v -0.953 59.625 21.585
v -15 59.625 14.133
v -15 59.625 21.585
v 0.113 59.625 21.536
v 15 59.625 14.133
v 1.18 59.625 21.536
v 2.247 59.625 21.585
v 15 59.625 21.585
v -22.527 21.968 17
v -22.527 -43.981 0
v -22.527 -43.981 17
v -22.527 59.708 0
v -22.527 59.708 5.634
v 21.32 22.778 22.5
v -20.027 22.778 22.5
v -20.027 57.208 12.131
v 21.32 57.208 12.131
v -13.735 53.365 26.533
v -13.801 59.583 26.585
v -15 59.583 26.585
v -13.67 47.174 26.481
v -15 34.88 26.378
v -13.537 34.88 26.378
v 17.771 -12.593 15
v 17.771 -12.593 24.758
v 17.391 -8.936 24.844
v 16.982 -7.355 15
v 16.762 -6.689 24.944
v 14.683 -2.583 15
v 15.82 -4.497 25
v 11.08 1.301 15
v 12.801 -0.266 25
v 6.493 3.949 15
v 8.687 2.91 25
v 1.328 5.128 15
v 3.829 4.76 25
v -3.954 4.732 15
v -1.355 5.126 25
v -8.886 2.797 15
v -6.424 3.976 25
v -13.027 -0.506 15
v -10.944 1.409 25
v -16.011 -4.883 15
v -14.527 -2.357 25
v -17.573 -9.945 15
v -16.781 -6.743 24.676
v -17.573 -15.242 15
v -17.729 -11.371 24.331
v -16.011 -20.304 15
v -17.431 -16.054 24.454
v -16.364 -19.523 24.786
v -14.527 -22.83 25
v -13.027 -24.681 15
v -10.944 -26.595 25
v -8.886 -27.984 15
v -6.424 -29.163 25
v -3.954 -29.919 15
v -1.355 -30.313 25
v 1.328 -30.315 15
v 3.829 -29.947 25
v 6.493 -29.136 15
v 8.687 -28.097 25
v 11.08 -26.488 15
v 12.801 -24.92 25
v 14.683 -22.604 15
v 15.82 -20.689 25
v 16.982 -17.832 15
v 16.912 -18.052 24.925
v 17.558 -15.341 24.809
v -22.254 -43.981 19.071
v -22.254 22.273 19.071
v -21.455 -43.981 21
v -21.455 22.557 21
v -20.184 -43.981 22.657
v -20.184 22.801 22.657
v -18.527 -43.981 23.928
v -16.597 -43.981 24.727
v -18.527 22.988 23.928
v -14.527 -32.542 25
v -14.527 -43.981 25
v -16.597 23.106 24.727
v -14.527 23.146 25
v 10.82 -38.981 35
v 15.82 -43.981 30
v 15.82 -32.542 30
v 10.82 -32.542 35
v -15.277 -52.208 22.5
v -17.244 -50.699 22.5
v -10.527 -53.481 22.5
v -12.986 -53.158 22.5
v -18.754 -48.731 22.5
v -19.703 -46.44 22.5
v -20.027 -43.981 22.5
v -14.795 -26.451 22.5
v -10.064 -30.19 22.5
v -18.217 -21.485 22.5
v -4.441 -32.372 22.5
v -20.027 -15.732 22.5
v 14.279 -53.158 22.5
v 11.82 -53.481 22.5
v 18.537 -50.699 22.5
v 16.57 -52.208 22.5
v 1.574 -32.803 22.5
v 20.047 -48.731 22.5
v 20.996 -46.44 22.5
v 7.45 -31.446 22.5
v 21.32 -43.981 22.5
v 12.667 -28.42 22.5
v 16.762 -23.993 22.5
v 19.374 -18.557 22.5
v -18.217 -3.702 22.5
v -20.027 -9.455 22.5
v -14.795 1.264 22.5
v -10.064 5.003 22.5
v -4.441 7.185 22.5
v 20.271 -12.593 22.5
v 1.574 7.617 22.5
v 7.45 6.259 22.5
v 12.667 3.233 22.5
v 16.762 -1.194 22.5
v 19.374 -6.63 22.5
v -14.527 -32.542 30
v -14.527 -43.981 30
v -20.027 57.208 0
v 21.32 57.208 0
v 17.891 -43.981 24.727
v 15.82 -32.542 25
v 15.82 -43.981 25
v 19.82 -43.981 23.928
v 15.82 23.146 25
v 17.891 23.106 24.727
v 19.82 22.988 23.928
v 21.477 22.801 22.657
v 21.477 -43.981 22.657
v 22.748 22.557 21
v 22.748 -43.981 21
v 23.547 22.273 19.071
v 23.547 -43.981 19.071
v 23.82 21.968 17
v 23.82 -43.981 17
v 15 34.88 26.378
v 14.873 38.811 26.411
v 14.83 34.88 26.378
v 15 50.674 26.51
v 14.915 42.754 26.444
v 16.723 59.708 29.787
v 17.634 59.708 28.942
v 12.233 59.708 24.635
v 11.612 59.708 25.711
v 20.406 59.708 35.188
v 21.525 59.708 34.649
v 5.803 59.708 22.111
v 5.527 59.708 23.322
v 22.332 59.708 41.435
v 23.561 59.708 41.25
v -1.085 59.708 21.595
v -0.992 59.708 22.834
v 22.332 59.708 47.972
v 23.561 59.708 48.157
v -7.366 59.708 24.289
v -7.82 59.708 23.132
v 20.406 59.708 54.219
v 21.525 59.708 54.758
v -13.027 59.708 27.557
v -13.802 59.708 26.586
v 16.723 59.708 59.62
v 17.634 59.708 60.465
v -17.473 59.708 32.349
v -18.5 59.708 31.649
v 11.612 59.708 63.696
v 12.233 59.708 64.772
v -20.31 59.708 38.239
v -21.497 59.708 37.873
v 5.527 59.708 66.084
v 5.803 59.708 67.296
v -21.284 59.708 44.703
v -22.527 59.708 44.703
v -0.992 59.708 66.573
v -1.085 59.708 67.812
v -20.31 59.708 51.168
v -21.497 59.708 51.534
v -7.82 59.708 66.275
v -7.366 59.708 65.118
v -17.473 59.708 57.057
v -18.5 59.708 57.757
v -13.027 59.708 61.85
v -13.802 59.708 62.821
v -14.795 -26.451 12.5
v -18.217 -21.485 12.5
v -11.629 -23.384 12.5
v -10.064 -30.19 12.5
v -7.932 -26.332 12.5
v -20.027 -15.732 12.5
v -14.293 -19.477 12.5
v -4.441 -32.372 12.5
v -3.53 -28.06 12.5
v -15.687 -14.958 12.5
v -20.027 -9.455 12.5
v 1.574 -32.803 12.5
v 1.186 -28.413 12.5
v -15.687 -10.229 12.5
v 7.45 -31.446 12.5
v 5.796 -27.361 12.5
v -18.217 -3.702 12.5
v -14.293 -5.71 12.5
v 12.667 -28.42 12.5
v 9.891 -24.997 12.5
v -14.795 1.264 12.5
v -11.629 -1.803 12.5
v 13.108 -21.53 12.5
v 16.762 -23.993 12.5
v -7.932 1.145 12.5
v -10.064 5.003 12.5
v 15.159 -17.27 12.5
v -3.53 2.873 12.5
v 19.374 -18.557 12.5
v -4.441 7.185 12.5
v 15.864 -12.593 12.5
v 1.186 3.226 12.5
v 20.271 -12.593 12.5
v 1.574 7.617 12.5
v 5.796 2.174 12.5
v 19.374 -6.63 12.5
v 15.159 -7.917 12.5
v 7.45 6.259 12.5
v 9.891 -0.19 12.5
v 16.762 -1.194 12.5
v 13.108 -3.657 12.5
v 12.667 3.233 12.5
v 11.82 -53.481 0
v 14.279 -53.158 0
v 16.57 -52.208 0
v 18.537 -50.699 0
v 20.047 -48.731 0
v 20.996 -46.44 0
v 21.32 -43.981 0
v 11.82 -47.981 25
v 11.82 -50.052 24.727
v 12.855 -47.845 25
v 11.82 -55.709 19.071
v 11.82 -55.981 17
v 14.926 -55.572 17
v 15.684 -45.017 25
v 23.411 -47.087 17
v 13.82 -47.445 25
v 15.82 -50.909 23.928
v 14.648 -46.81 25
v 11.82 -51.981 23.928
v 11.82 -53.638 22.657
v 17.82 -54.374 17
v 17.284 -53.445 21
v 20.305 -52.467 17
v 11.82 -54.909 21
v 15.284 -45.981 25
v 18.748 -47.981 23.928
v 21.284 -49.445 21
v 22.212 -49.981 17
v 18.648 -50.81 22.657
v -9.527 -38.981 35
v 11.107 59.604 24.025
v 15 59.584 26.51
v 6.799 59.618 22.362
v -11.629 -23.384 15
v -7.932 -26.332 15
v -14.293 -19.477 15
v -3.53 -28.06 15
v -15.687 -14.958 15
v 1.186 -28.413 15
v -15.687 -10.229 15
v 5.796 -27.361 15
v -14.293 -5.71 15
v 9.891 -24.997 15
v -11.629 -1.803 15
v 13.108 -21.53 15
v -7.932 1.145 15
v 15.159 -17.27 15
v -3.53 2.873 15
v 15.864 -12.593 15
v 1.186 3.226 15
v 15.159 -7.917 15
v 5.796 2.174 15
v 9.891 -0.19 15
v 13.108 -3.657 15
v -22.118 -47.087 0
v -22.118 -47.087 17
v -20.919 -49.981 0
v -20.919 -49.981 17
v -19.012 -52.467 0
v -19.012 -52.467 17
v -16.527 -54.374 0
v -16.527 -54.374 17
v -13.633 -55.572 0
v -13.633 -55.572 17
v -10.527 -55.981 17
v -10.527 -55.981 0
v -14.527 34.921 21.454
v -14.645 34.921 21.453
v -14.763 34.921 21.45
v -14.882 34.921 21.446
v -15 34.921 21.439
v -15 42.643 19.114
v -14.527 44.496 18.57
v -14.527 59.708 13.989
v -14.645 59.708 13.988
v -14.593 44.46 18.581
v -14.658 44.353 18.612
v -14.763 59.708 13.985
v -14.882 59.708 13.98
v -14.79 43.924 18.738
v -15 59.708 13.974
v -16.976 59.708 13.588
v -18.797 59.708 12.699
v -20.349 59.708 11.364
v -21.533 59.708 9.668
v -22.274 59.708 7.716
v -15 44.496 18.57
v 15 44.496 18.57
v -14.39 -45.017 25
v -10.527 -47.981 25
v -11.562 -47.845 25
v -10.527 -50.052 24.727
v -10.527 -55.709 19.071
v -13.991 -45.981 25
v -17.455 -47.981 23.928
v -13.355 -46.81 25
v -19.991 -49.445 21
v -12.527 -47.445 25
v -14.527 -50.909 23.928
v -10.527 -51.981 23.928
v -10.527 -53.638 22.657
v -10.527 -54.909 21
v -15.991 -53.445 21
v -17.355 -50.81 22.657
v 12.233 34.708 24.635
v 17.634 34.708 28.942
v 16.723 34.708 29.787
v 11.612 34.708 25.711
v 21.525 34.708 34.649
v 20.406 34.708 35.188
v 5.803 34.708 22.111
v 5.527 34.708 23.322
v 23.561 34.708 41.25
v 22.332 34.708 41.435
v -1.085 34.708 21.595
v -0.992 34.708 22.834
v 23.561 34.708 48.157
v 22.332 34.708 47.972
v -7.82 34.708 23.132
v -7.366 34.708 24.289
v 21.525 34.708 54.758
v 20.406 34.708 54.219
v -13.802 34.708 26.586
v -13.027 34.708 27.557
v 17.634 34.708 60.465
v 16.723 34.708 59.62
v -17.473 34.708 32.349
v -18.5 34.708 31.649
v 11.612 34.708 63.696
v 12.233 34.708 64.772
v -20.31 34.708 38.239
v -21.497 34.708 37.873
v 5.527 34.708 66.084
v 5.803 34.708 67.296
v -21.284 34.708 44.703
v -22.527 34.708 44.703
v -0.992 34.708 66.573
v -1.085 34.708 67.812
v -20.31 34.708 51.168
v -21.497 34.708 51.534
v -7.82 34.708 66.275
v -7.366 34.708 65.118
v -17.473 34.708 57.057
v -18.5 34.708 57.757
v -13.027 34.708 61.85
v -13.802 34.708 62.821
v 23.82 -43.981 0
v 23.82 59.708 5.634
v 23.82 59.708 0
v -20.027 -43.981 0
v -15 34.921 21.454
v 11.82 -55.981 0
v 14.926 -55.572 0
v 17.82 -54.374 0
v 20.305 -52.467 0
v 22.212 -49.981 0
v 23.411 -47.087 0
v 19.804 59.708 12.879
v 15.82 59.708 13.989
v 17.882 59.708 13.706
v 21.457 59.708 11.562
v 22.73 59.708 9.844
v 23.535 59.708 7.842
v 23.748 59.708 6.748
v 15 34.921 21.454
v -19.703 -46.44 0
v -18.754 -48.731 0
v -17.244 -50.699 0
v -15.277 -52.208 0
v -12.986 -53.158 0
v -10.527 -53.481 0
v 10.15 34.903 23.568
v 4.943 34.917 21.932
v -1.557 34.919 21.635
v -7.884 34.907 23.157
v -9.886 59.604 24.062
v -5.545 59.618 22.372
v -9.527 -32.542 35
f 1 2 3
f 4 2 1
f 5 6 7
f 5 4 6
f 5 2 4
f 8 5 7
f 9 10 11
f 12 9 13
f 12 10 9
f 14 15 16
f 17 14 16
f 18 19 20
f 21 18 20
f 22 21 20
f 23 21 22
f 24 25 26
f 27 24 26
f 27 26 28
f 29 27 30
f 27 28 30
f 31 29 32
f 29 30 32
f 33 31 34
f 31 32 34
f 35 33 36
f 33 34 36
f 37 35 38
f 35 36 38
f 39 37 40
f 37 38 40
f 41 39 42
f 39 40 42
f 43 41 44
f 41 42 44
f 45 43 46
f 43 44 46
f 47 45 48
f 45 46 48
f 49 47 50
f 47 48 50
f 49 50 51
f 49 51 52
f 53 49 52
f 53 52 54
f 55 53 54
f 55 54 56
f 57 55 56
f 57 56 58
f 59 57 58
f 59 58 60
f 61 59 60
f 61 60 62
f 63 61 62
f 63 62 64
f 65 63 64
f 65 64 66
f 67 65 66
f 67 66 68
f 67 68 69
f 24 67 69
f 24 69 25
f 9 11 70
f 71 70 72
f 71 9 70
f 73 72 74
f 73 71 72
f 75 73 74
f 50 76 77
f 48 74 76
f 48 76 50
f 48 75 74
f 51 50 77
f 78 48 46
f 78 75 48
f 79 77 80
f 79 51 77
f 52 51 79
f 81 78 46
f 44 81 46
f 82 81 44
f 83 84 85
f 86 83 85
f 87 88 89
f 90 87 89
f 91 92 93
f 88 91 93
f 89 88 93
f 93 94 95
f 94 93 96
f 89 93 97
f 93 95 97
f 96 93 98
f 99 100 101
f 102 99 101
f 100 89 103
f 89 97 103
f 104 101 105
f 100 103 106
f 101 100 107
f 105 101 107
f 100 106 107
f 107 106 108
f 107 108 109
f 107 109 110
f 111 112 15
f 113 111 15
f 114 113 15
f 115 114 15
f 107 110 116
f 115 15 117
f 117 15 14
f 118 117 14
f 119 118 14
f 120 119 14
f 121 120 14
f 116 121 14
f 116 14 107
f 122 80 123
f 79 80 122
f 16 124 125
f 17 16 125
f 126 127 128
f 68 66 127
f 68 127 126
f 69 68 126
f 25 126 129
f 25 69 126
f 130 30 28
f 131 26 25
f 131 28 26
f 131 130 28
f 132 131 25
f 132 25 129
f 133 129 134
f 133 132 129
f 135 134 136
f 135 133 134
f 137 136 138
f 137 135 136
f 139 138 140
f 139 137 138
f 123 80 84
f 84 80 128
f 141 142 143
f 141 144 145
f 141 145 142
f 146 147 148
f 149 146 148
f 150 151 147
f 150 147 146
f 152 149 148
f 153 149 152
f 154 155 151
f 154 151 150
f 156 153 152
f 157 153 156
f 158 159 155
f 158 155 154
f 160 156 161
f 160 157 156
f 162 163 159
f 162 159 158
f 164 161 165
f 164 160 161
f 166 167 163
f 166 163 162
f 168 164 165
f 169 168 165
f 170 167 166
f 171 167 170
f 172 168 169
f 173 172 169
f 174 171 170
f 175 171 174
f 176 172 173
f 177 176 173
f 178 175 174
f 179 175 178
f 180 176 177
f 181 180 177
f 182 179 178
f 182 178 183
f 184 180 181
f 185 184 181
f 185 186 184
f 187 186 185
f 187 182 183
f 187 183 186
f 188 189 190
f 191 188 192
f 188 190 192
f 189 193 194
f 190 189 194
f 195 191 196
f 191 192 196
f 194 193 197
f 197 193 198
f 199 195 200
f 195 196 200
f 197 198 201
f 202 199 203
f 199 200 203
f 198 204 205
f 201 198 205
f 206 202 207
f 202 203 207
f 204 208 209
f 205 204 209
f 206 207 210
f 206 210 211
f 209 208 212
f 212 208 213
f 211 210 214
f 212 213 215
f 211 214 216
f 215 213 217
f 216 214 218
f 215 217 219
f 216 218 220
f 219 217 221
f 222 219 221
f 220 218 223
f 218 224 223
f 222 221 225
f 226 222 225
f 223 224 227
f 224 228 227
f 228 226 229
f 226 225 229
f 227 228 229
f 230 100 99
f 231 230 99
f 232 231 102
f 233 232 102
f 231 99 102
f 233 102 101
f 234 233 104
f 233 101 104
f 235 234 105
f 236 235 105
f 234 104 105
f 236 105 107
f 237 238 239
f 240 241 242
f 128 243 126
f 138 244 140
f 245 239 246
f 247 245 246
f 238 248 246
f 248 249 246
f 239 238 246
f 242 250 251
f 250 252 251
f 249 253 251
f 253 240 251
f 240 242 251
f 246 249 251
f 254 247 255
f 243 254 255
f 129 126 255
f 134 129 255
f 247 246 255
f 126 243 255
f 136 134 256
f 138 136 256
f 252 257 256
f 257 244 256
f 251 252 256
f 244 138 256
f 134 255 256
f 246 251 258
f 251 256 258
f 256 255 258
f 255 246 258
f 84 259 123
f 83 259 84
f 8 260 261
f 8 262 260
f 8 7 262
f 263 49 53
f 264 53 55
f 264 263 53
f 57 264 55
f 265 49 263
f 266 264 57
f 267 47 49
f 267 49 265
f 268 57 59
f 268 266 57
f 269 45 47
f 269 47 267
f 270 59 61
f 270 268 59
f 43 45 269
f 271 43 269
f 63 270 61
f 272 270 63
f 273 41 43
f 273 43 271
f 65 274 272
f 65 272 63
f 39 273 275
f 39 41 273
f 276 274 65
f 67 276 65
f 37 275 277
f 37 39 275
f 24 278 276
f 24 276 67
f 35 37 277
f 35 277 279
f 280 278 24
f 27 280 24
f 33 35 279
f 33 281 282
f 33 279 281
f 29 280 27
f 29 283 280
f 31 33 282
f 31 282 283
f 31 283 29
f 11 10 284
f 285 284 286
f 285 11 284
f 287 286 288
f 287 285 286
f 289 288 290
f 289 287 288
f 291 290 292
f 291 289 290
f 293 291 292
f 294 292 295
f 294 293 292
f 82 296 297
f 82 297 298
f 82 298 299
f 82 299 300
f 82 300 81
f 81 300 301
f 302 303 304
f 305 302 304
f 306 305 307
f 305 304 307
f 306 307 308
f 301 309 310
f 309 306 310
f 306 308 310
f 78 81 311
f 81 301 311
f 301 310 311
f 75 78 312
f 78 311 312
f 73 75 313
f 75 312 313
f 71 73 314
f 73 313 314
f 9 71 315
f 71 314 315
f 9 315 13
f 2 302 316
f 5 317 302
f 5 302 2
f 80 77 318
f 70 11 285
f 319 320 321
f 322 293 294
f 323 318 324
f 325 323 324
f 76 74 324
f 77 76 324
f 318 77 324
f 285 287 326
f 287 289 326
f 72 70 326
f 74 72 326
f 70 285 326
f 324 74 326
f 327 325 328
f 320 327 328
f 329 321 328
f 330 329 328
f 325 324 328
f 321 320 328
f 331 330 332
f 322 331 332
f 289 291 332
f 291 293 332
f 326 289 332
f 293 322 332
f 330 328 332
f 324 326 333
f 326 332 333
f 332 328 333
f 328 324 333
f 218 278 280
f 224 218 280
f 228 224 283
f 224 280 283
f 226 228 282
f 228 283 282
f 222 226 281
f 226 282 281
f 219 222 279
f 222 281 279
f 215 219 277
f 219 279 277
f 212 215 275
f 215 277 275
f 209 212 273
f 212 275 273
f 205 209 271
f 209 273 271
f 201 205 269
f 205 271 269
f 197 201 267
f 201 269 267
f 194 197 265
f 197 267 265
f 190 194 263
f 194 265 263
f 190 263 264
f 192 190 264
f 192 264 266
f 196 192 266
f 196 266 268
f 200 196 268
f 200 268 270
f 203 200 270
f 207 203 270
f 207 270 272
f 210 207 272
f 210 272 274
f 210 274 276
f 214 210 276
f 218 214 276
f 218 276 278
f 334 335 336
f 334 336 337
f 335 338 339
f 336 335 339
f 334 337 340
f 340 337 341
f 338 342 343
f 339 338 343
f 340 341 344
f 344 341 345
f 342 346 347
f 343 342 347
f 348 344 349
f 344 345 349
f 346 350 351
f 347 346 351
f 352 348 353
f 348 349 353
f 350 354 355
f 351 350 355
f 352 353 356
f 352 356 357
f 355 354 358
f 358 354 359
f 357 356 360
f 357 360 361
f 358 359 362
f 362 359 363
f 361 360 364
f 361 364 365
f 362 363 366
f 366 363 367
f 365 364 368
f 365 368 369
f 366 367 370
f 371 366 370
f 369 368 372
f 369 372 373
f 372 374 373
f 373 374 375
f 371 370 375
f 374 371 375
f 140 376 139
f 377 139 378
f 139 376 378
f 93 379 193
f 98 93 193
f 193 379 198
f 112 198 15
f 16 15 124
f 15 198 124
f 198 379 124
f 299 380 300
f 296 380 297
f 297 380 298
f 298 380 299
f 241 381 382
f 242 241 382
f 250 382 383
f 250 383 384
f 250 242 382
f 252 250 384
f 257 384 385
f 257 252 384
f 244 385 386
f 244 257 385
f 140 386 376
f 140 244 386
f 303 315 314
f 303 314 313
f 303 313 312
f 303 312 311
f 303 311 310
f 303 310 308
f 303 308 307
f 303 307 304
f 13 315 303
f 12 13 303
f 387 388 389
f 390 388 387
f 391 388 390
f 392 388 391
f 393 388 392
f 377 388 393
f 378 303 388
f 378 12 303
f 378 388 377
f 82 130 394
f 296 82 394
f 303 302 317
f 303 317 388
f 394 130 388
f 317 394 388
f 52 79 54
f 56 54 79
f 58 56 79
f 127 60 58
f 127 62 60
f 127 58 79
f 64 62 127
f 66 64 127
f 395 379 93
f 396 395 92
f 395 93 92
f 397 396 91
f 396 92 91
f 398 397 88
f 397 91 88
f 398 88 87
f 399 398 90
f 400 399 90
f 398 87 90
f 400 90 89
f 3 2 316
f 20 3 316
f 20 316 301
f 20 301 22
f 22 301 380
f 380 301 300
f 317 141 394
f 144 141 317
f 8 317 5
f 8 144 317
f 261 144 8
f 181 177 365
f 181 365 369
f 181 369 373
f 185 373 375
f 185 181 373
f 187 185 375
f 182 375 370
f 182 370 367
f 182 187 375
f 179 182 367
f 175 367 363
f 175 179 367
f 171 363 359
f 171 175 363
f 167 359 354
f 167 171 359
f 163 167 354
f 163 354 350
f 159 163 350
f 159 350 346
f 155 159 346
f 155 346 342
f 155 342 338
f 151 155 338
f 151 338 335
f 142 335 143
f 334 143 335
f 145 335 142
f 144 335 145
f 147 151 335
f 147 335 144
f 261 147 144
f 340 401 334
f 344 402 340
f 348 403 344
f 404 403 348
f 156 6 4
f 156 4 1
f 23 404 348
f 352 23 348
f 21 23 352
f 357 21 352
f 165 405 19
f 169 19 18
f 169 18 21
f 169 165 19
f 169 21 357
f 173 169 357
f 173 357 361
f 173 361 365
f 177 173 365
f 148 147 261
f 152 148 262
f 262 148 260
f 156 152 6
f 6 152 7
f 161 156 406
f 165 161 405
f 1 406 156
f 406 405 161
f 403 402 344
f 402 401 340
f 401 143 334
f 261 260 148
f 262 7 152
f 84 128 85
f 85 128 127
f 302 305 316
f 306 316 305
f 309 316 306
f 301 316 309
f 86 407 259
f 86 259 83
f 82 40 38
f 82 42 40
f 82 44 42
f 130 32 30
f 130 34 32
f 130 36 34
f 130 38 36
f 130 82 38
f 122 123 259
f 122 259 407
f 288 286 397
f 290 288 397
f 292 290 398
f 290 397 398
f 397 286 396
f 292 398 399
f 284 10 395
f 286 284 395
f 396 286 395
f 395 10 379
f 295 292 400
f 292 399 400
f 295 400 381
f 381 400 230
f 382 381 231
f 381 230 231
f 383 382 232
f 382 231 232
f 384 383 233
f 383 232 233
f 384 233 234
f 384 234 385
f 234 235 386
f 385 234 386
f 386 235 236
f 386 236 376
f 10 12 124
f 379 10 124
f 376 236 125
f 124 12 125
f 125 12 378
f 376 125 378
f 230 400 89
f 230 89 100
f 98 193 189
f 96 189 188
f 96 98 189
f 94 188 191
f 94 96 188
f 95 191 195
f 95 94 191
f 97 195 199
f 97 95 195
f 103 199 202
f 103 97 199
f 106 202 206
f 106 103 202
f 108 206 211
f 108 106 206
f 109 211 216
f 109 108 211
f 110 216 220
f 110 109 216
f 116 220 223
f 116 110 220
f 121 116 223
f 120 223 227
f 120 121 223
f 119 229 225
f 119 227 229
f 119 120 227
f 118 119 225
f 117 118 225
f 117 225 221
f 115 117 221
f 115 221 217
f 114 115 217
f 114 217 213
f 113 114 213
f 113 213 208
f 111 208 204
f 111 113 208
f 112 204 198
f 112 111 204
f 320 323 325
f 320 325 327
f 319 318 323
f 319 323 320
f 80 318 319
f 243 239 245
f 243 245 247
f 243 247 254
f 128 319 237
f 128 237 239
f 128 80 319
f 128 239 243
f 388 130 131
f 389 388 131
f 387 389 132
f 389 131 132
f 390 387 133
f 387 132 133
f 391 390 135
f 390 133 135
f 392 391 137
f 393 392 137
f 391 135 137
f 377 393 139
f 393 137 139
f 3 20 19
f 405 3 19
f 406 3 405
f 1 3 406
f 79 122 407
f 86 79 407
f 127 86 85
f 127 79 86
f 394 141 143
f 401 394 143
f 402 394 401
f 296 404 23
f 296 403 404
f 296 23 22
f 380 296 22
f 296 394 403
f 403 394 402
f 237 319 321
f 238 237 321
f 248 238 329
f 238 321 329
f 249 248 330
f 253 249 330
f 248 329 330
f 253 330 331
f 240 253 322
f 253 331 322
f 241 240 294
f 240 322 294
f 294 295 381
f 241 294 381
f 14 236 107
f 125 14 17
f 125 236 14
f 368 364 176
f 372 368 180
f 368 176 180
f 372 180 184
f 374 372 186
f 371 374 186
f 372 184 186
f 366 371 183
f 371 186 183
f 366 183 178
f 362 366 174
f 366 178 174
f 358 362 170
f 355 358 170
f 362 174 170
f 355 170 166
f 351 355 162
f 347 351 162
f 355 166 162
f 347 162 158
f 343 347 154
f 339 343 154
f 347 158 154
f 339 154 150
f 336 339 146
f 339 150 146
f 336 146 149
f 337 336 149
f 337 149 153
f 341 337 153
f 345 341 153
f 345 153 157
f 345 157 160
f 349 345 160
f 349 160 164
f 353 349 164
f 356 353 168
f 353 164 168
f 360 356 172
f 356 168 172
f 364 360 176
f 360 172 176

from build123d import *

# Parameters (mm, degrees)
F0_W           = 46.3467240334
F0_H           = 115.6897172332
F1_DEPTH       = 25
F2_R           = 12
F4_DEPTH       = 40
F4_DEPTH_BACK  = 40
F6_R           = 17.7712313218
F7_DEPTH       = 10
F8_R           = 23.1733620167
F9_DEPTH       = 25
F11_R          = 21.9307918762
F12_DEPTH      = 25
F14_DEPTH      = 15
F14_DEPTH_BACK = 15
F15_T          = 2.5
F16_R          = 15.8642477534
F17_DEPTH      = 25
F18_DEPTH      = 5
F19_DEPTH      = 25
F20_T1_DEPTH   = 101.1275982577
F20_T3_DEPTH   = 92.184276345
F20_T5_DEPTH   = 22.3467240334
F20_T8_ANGLE   = 90
F20_T12_DEPTH  = 92.184276345
F20_T17_DEPTH  = 92.184276345
F20_T22_DEPTH  = 92.184276345
F20_T27_DEPTH  = 101.1275982577
F20_T30_ANGLE  = 90
F21_W          = 30.3467240334
F21_H          = 11.4395302832
F22_DEPTH      = 10
F23_SIZE       = 5


# Not quite as in the source:
# - a fillet or chamfer that OpenCascade refuses, or shapes differently, is made with other operations: its cross-section is extruded or revolved along the edge and cut away or added
# - a shell that OpenCascade refuses in one call is made with other operations: the cavity is built on its own and cut out


with BuildPart() as f1:
    # F0 (on Top) → F1 (new body)
    with BuildSketch(Plane.XY):
        with Locations((7.814258337, 1.8636099994)):
            Rectangle(F0_W, F0_H)
    extrude(amount=F1_DEPTH)

    # F2
    f2_edges = [f1.edges().sort_by_distance(p)[0] for p in [
        (30.98762, -55.981249, 12.5),
        (-15.359104, -55.981249, 12.5),
    ]]
    fillet(f2_edges, radius=F2_R)

    # F3 (on Right) → F4 (cut, two sides)
    with BuildSketch(Plane.YZ) as f4_sk:
        Polygon((0, 31.970962882), (68.2880878448, 11.4047080278), (67.6364898682, 28.4685865045), align=None)
    extrude(amount=F4_DEPTH, mode=Mode.SUBTRACT)
    extrude(f4_sk.sketch, amount=-F4_DEPTH_BACK, mode=Mode.SUBTRACT)


with BuildPart() as f1_1:
    # F5: moved
    add(f1.part.moved(Location((-7.1676671505, 0, 0))))

    # F6 (on face) → F7 (cut)
    with BuildSketch(Plane.XY.offset(25)):
        with Locations((0, -12.5934332609)):
            Circle(F6_R)
    extrude(amount=-F7_DEPTH, mode=Mode.SUBTRACT)

    # F15: shell of thickness 2.5, made by hand


with BuildPart() as f9:
    # F8 (on face) → F9 (new body)
    with BuildSketch(Plane(origin=(0, 59.708468616, 0), x_dir=(-1, 0, 0), z_dir=(0, 1, 0))):
        with Locations((-0.6465911865, 33.9257717133)):
            Circle(F8_R)
    extrude(amount=-F9_DEPTH)


with BuildPart() as f9_1:
    # F10: moved
    add(f9.part.moved(Location((0, 0, 10.7776373625))))

    # F11 (on face) → F12 (cut)
    with BuildSketch(Plane(origin=(0, 59.708468616, 0), x_dir=(-1, 0, 0), z_dir=(0, 1, 0))):
        with Locations((-0.6465911865, 44.7034090757)):
            Circle(F11_R)
    extrude(amount=-F12_DEPTH, mode=Mode.SUBTRACT)


with BuildPart() as f14:
    # F13 (on Right) → F14 (new body, two sides)
    with BuildSketch(Plane.YZ) as f14_sk:
        Polygon((59.624966234, 14.1331925988), (59.624966234, 21.5853508562), (34.9215567112, 21.3780961931), align=None)
    extrude(amount=F14_DEPTH)
    extrude(f14_sk.sketch, amount=-F14_DEPTH_BACK)


with BuildPart() as f15_core1:
    # F15_t2: copy of F1
    add(f1_1.part)

    # the walls: a layer under each face that stays
    f15_faces = [f15_core1.faces().sort_by_distance(p)[0] for p in [
        (-22.5267708302, 7.8636099994, 12.5),
        (-19.0120522044, -52.4665299914, 12.5),
        (-14.8023168246, -42.7933155742, 25),
        (0.6465911865, 41.4274091283, 19.4943116685),
        (0.6465911865, 59.708468616, 6.9943116685),
        (0.6465911865, -55.9812486172, 12.5),
        (23.8199532032, 7.8636099994, 12.5),
        (20.3052345774, -52.4665299914, 12.5),
        (-17.7712313218, -12.5934332609, 20),
        (0, -12.5934332609, 15),
    ]]
    thicken(f15_faces, amount=-F15_T, mode=Mode.SUBTRACT)

    # F15_s3 → F15_t4 (revolve, cut)
    with BuildSketch(Plane.XZ.offset(12.5934332609)):
        Polygon((17.7462313218, 15.025), (20.2712313218, 15), (20.2712313218, 12.5), (17.7712313218, 12.5), align=None)
    revolve(axis=Axis((0, -12.5934332609, 15), (0, 0, 1)), mode=Mode.SUBTRACT)


with BuildPart() as f1_2:
    add(f1_1.part)

    # what is left inside the walls is the cavity
    f15_cavity = [f15_core1.part.solids().sort_by_distance(p)[0] for p in [
        (0.646591, -16.584676, 0.025),
    ]]
    add(f15_cavity, mode=Mode.SUBTRACT)

    # F16 (on face) → F17 (cut)
    with BuildSketch(Plane.XY.offset(15)):
        with Locations((0, -12.5934332609)):
            Circle(F16_R)
    extrude(amount=-F17_DEPTH, mode=Mode.SUBTRACT)

    # F18 (add): a face of the model
    f18_faces = [f14.part.faces().sort_by_distance(p)[0] for p in [
        (0, 47.2732614726, 21.4817235246),
    ]]

    add(f9_1.part)  # F18 merges F9

    add(f14.part)  # F18 merges F14
    extrude(f18_faces, amount=F18_DEPTH)

    # F11 (on face) → F19 (cut)
    with BuildSketch(Plane(origin=(0, 59.708468616, 0), x_dir=(-1, 0, 0), z_dir=(0, 1, 0))):
        with Locations((-0.6465911865, 44.7034090757)):
            Circle(F11_R)
    extrude(amount=-F19_DEPTH, mode=Mode.SUBTRACT)

    # F20: fillet of radius 8 on 7 edges, made by hand

    # F20_s2 → F20_t1 (cut)
    with BuildSketch(Plane.XZ.offset(-57.1463496406)):
        with BuildLine():
            ThreePointArc((15.8199532032, 25), (21.4768074527, 22.6568542495), (23.8199532032, 17))
            Line((23.8199532032, 17), (23.8199532032, 25))
            Line((23.8199532032, 25), (15.8199532032, 25))
        make_face()
    extrude(amount=F20_T1_DEPTH, mode=Mode.SUBTRACT)

    # F20_s4 → F20_t3 (cut)
    with BuildSketch(Plane(origin=(0, -18.2371947161, 5.4924776223), x_dir=(1, 0, 0), z_dir=(0, 0.9575176611, -0.2883746326))):
        with BuildLine():
            ThreePointArc((15.8199532032, -30.6127616009), (21.4768074527, -28.2696158504), (23.8199532032, -22.6127616009))
            Line((23.8199532032, -22.6127616009), (23.8199532032, -30.6127616009))
            Line((23.8199532032, -30.6127616009), (15.8199532032, -30.6127616009))
        make_face()
    extrude(amount=F20_T3_DEPTH, mode=Mode.SUBTRACT)

    # F20_s6 → F20_t5 (cut)
    with BuildSketch(Plane.YZ.offset(-10.5267708302)):
        with BuildLine():
            ThreePointArc((-47.9812486172, 25), (-53.6381028667, 22.6568542495), (-55.9812486172, 17))
            Line((-55.9812486172, 17), (-55.9812486172, 25))
            Line((-55.9812486172, 25), (-47.9812486172, 25))
        make_face()
    extrude(amount=F20_T5_DEPTH, mode=Mode.SUBTRACT)

    # F20_s7 → F20_t8 (revolve, cut)
    with BuildSketch(Plane.YZ.offset(11.8199532032)):
        with BuildLine():
            ThreePointArc((-47.9812486172, 25), (-53.6381028667, 22.6568542495), (-55.9812486172, 17))
            Line((-55.9812486172, 17), (-55.9812486172, 25))
            Line((-55.9812486172, 25), (-47.9812486172, 25))
        make_face()
    revolve(axis=Axis((11.8199532032, -43.9812486172, 25), (0, 0, 1)), revolution_arc=F20_T8_ANGLE, mode=Mode.SUBTRACT)


with BuildPart() as f20_tool10:
    # F20_s11 → F20_t12 (new body)
    with BuildSketch(Plane(origin=(0, 70.0308779571, -21.0911292025), x_dir=(1, 0, 0), z_dir=(0, -0.9575176611, 0.2883746326))):
        with BuildLine():
            ThreePointArc((-14.5267708302, 30.6127616009), (-20.1836250796, 28.2696158504), (-22.5267708302, 22.6127616009))
            Line((-22.5267708302, 22.6127616009), (-22.5267708302, 30.6127616009))
            Line((-22.5267708302, 30.6127616009), (-14.5267708302, 30.6127616009))
        make_face()
    extrude(amount=F20_T12_DEPTH)

    split(bisect_by=Plane(origin=(0, 8.5388595544, 29.1154936273), x_dir=(1, 0, 0), z_dir=(0, -0.281422426, -0.9595839818)), keep=Keep.TOP)


with BuildPart() as f1_3:
    add(f1_2.part)

    # F20_t9: cut F20_tool10
    add(f20_tool10.part, mode=Mode.SUBTRACT)


with BuildPart() as f20_tool15:
    # F20_s16 → F20_t17 (new body)
    with BuildSketch(Plane(origin=(0, 70.0308779571, -21.0911292025), x_dir=(1, 0, 0), z_dir=(0, -0.9575176611, 0.2883746326))):
        with BuildLine():
            ThreePointArc((-14.5267708302, 30.6127616009), (-20.1836250796, 28.2696158504), (-22.5267708302, 22.6127616009))
            Line((-22.5267708302, 22.6127616009), (-22.5267708302, 30.6127616009))
            Line((-22.5267708302, 30.6127616009), (-14.5267708302, 30.6127616009))
        make_face()
    extrude(amount=F20_T17_DEPTH)

    split(bisect_by=Plane.YZ.offset(-15), keep=Keep.BOTTOM)


with BuildPart() as f1_4:
    add(f1_3.part)

    # F20_t14: cut F20_tool15
    add(f20_tool15.part, mode=Mode.SUBTRACT)


with BuildPart() as f20_tool20:
    # F20_s21 → F20_t22 (new body)
    with BuildSketch(Plane(origin=(0, 70.0308779571, -21.0911292025), x_dir=(1, 0, 0), z_dir=(0, -0.9575176611, 0.2883746326))):
        with BuildLine():
            ThreePointArc((-14.5267708302, 30.6127616009), (-20.1836250796, 28.2696158504), (-22.5267708302, 22.6127616009))
            Line((-22.5267708302, 22.6127616009), (-22.5267708302, 30.6127616009))
            Line((-22.5267708302, 30.6127616009), (-14.5267708302, 30.6127616009))
        make_face()
    extrude(amount=F20_T22_DEPTH)

    split(bisect_by=Plane(origin=(0, 35.0984424425, 0.2944660678), x_dir=(1, 0, 0), z_dir=(0, -0.9999648082, -0.0083894237)), keep=Keep.TOP)


with BuildPart() as f1_5:
    add(f1_4.part)

    # F20_t19: cut F20_tool20
    add(f20_tool20.part, mode=Mode.SUBTRACT)


with BuildPart() as f20_tool25:
    # F20_s26 → F20_t27 (new body)
    with BuildSketch(Plane.XZ.offset(-57.1463496406)):
        with BuildLine():
            ThreePointArc((-22.5267708302, 17), (-20.1836250796, 22.6568542495), (-14.5267708302, 25))
            Line((-14.5267708302, 25), (-22.5267708302, 25))
            Line((-22.5267708302, 25), (-22.5267708302, 17))
        make_face()
    extrude(amount=F20_T27_DEPTH)

    split(bisect_by=Plane(origin=(0, 8.8279438803, 29.312259887), x_dir=(1, 0, 0), z_dir=(0, -0.2883746326, -0.9575176611)), keep=Keep.TOP)


with BuildPart() as f1_6:
    add(f1_5.part)

    # F20_t24: cut F20_tool25
    add(f20_tool25.part, mode=Mode.SUBTRACT)

    # F20_s29 → F20_t30 (revolve, cut)
    with BuildSketch(Plane.XZ.offset(43.9812486172)):
        with BuildLine():
            ThreePointArc((-14.5267708302, 25), (-20.1836250796, 22.6568542495), (-22.5267708302, 17))
            Line((-22.5267708302, 17), (-22.5267708302, 25))
            Line((-22.5267708302, 25), (-14.5267708302, 25))
        make_face()
    revolve(axis=Axis((-10.5267708302, -43.9812486172, 25), (0, 0, 1)), revolution_arc=F20_T30_ANGLE, mode=Mode.SUBTRACT)

    # F21 (on face) → F22 (join)
    with BuildSketch(Plane.XY.offset(25)):
        with Locations((0.6465911865, -38.2614834756)):
            Rectangle(F21_W, F21_H)
    extrude(amount=F22_DEPTH)

    # F23
    f23_edges = [f1_6.edges().sort_by_distance(p)[0] for p in [
        (15.819953, -38.261483, 35),
        (-14.526771, -38.261483, 35),
        (0.646591, -43.981249, 35),
    ]]
    chamfer(f23_edges, length=F23_SIZE)


solid = f1_6.part
